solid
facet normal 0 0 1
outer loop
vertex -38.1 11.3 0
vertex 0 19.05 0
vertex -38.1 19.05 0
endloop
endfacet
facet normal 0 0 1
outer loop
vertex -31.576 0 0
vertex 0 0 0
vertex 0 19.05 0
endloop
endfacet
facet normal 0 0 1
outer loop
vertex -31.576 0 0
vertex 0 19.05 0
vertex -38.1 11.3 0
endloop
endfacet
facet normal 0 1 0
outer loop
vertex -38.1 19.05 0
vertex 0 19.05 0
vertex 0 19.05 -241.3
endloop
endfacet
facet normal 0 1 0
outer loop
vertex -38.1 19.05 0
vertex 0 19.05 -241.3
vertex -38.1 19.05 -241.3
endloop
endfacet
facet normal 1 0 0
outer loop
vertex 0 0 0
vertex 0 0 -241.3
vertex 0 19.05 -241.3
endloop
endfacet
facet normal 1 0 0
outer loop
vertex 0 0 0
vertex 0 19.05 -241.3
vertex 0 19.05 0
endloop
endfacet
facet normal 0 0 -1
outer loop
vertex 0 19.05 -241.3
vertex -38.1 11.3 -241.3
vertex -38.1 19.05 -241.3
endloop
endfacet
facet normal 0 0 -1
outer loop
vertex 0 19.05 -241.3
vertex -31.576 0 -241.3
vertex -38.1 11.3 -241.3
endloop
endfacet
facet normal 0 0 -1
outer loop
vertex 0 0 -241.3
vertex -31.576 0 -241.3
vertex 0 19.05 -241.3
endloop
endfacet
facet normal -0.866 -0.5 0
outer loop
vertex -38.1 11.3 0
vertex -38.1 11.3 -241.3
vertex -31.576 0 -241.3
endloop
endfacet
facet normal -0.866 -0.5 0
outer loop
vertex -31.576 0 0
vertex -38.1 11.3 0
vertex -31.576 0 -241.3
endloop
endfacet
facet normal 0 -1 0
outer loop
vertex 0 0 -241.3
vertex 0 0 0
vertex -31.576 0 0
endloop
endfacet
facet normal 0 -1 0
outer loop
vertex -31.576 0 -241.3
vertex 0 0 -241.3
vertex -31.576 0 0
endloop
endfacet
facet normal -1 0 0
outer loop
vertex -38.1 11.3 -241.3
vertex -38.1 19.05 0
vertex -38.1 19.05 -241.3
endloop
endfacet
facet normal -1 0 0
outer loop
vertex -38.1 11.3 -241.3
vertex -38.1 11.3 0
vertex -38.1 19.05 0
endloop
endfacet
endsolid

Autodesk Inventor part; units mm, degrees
ref_plane "YZ Plane" through (0, 0, 0) normal (1, 0, 0) x (0, 1, 0)
ref_plane "XZ Plane" through (0, 0, 0) normal (0, 1, 0) x (-1, 0, 0)
ref_plane "XY Plane" through (0, 0, 0) normal (0, 0, 1) x (1, 0, 0)
sketch "Sketch1" plane through (0, 0, 0) normal (0, 1, 0) x (-1, 0, 0)
  line L0 (0, 0) -> (38.1, 0)
  line L1 (38.1, 0) -> (38.1, -241.3)
  line L2 (38.1, -241.3) -> (0, -241.3)
  line L3 (0, -241.3) -> (0, 0)
  dimension "d0" = 38.1
  dimension "d1" = 241.3
extrude "Extrusion1" add sketch "Sketch1" along normal blind 19.05
sketch "Sketch2" plane through (0, 0, -241.3) normal (0, 0, -1) x (-1, 0, 0)
  line L0 (204.3257, -100.8201) -> (38.1, 11.3005) projected
  line L1 (38.1, 11.3005) -> (31.5757, 0)
  line L2 (0, 0) -> (38.1, 0) projected
  line L3 (38.1, 11.3005) -> (51.1487, 11.3005) construction
  line L4 (31.5757, 0) -> (38.1, 0)
  line L5 (38.1, 0) -> (38.1, 11.3005)
  dimension "d4" = 120
extrude "Extrusion2" cut sketch "Sketch2" against normal blind 241.3
properties part number "front_screen_footer"
